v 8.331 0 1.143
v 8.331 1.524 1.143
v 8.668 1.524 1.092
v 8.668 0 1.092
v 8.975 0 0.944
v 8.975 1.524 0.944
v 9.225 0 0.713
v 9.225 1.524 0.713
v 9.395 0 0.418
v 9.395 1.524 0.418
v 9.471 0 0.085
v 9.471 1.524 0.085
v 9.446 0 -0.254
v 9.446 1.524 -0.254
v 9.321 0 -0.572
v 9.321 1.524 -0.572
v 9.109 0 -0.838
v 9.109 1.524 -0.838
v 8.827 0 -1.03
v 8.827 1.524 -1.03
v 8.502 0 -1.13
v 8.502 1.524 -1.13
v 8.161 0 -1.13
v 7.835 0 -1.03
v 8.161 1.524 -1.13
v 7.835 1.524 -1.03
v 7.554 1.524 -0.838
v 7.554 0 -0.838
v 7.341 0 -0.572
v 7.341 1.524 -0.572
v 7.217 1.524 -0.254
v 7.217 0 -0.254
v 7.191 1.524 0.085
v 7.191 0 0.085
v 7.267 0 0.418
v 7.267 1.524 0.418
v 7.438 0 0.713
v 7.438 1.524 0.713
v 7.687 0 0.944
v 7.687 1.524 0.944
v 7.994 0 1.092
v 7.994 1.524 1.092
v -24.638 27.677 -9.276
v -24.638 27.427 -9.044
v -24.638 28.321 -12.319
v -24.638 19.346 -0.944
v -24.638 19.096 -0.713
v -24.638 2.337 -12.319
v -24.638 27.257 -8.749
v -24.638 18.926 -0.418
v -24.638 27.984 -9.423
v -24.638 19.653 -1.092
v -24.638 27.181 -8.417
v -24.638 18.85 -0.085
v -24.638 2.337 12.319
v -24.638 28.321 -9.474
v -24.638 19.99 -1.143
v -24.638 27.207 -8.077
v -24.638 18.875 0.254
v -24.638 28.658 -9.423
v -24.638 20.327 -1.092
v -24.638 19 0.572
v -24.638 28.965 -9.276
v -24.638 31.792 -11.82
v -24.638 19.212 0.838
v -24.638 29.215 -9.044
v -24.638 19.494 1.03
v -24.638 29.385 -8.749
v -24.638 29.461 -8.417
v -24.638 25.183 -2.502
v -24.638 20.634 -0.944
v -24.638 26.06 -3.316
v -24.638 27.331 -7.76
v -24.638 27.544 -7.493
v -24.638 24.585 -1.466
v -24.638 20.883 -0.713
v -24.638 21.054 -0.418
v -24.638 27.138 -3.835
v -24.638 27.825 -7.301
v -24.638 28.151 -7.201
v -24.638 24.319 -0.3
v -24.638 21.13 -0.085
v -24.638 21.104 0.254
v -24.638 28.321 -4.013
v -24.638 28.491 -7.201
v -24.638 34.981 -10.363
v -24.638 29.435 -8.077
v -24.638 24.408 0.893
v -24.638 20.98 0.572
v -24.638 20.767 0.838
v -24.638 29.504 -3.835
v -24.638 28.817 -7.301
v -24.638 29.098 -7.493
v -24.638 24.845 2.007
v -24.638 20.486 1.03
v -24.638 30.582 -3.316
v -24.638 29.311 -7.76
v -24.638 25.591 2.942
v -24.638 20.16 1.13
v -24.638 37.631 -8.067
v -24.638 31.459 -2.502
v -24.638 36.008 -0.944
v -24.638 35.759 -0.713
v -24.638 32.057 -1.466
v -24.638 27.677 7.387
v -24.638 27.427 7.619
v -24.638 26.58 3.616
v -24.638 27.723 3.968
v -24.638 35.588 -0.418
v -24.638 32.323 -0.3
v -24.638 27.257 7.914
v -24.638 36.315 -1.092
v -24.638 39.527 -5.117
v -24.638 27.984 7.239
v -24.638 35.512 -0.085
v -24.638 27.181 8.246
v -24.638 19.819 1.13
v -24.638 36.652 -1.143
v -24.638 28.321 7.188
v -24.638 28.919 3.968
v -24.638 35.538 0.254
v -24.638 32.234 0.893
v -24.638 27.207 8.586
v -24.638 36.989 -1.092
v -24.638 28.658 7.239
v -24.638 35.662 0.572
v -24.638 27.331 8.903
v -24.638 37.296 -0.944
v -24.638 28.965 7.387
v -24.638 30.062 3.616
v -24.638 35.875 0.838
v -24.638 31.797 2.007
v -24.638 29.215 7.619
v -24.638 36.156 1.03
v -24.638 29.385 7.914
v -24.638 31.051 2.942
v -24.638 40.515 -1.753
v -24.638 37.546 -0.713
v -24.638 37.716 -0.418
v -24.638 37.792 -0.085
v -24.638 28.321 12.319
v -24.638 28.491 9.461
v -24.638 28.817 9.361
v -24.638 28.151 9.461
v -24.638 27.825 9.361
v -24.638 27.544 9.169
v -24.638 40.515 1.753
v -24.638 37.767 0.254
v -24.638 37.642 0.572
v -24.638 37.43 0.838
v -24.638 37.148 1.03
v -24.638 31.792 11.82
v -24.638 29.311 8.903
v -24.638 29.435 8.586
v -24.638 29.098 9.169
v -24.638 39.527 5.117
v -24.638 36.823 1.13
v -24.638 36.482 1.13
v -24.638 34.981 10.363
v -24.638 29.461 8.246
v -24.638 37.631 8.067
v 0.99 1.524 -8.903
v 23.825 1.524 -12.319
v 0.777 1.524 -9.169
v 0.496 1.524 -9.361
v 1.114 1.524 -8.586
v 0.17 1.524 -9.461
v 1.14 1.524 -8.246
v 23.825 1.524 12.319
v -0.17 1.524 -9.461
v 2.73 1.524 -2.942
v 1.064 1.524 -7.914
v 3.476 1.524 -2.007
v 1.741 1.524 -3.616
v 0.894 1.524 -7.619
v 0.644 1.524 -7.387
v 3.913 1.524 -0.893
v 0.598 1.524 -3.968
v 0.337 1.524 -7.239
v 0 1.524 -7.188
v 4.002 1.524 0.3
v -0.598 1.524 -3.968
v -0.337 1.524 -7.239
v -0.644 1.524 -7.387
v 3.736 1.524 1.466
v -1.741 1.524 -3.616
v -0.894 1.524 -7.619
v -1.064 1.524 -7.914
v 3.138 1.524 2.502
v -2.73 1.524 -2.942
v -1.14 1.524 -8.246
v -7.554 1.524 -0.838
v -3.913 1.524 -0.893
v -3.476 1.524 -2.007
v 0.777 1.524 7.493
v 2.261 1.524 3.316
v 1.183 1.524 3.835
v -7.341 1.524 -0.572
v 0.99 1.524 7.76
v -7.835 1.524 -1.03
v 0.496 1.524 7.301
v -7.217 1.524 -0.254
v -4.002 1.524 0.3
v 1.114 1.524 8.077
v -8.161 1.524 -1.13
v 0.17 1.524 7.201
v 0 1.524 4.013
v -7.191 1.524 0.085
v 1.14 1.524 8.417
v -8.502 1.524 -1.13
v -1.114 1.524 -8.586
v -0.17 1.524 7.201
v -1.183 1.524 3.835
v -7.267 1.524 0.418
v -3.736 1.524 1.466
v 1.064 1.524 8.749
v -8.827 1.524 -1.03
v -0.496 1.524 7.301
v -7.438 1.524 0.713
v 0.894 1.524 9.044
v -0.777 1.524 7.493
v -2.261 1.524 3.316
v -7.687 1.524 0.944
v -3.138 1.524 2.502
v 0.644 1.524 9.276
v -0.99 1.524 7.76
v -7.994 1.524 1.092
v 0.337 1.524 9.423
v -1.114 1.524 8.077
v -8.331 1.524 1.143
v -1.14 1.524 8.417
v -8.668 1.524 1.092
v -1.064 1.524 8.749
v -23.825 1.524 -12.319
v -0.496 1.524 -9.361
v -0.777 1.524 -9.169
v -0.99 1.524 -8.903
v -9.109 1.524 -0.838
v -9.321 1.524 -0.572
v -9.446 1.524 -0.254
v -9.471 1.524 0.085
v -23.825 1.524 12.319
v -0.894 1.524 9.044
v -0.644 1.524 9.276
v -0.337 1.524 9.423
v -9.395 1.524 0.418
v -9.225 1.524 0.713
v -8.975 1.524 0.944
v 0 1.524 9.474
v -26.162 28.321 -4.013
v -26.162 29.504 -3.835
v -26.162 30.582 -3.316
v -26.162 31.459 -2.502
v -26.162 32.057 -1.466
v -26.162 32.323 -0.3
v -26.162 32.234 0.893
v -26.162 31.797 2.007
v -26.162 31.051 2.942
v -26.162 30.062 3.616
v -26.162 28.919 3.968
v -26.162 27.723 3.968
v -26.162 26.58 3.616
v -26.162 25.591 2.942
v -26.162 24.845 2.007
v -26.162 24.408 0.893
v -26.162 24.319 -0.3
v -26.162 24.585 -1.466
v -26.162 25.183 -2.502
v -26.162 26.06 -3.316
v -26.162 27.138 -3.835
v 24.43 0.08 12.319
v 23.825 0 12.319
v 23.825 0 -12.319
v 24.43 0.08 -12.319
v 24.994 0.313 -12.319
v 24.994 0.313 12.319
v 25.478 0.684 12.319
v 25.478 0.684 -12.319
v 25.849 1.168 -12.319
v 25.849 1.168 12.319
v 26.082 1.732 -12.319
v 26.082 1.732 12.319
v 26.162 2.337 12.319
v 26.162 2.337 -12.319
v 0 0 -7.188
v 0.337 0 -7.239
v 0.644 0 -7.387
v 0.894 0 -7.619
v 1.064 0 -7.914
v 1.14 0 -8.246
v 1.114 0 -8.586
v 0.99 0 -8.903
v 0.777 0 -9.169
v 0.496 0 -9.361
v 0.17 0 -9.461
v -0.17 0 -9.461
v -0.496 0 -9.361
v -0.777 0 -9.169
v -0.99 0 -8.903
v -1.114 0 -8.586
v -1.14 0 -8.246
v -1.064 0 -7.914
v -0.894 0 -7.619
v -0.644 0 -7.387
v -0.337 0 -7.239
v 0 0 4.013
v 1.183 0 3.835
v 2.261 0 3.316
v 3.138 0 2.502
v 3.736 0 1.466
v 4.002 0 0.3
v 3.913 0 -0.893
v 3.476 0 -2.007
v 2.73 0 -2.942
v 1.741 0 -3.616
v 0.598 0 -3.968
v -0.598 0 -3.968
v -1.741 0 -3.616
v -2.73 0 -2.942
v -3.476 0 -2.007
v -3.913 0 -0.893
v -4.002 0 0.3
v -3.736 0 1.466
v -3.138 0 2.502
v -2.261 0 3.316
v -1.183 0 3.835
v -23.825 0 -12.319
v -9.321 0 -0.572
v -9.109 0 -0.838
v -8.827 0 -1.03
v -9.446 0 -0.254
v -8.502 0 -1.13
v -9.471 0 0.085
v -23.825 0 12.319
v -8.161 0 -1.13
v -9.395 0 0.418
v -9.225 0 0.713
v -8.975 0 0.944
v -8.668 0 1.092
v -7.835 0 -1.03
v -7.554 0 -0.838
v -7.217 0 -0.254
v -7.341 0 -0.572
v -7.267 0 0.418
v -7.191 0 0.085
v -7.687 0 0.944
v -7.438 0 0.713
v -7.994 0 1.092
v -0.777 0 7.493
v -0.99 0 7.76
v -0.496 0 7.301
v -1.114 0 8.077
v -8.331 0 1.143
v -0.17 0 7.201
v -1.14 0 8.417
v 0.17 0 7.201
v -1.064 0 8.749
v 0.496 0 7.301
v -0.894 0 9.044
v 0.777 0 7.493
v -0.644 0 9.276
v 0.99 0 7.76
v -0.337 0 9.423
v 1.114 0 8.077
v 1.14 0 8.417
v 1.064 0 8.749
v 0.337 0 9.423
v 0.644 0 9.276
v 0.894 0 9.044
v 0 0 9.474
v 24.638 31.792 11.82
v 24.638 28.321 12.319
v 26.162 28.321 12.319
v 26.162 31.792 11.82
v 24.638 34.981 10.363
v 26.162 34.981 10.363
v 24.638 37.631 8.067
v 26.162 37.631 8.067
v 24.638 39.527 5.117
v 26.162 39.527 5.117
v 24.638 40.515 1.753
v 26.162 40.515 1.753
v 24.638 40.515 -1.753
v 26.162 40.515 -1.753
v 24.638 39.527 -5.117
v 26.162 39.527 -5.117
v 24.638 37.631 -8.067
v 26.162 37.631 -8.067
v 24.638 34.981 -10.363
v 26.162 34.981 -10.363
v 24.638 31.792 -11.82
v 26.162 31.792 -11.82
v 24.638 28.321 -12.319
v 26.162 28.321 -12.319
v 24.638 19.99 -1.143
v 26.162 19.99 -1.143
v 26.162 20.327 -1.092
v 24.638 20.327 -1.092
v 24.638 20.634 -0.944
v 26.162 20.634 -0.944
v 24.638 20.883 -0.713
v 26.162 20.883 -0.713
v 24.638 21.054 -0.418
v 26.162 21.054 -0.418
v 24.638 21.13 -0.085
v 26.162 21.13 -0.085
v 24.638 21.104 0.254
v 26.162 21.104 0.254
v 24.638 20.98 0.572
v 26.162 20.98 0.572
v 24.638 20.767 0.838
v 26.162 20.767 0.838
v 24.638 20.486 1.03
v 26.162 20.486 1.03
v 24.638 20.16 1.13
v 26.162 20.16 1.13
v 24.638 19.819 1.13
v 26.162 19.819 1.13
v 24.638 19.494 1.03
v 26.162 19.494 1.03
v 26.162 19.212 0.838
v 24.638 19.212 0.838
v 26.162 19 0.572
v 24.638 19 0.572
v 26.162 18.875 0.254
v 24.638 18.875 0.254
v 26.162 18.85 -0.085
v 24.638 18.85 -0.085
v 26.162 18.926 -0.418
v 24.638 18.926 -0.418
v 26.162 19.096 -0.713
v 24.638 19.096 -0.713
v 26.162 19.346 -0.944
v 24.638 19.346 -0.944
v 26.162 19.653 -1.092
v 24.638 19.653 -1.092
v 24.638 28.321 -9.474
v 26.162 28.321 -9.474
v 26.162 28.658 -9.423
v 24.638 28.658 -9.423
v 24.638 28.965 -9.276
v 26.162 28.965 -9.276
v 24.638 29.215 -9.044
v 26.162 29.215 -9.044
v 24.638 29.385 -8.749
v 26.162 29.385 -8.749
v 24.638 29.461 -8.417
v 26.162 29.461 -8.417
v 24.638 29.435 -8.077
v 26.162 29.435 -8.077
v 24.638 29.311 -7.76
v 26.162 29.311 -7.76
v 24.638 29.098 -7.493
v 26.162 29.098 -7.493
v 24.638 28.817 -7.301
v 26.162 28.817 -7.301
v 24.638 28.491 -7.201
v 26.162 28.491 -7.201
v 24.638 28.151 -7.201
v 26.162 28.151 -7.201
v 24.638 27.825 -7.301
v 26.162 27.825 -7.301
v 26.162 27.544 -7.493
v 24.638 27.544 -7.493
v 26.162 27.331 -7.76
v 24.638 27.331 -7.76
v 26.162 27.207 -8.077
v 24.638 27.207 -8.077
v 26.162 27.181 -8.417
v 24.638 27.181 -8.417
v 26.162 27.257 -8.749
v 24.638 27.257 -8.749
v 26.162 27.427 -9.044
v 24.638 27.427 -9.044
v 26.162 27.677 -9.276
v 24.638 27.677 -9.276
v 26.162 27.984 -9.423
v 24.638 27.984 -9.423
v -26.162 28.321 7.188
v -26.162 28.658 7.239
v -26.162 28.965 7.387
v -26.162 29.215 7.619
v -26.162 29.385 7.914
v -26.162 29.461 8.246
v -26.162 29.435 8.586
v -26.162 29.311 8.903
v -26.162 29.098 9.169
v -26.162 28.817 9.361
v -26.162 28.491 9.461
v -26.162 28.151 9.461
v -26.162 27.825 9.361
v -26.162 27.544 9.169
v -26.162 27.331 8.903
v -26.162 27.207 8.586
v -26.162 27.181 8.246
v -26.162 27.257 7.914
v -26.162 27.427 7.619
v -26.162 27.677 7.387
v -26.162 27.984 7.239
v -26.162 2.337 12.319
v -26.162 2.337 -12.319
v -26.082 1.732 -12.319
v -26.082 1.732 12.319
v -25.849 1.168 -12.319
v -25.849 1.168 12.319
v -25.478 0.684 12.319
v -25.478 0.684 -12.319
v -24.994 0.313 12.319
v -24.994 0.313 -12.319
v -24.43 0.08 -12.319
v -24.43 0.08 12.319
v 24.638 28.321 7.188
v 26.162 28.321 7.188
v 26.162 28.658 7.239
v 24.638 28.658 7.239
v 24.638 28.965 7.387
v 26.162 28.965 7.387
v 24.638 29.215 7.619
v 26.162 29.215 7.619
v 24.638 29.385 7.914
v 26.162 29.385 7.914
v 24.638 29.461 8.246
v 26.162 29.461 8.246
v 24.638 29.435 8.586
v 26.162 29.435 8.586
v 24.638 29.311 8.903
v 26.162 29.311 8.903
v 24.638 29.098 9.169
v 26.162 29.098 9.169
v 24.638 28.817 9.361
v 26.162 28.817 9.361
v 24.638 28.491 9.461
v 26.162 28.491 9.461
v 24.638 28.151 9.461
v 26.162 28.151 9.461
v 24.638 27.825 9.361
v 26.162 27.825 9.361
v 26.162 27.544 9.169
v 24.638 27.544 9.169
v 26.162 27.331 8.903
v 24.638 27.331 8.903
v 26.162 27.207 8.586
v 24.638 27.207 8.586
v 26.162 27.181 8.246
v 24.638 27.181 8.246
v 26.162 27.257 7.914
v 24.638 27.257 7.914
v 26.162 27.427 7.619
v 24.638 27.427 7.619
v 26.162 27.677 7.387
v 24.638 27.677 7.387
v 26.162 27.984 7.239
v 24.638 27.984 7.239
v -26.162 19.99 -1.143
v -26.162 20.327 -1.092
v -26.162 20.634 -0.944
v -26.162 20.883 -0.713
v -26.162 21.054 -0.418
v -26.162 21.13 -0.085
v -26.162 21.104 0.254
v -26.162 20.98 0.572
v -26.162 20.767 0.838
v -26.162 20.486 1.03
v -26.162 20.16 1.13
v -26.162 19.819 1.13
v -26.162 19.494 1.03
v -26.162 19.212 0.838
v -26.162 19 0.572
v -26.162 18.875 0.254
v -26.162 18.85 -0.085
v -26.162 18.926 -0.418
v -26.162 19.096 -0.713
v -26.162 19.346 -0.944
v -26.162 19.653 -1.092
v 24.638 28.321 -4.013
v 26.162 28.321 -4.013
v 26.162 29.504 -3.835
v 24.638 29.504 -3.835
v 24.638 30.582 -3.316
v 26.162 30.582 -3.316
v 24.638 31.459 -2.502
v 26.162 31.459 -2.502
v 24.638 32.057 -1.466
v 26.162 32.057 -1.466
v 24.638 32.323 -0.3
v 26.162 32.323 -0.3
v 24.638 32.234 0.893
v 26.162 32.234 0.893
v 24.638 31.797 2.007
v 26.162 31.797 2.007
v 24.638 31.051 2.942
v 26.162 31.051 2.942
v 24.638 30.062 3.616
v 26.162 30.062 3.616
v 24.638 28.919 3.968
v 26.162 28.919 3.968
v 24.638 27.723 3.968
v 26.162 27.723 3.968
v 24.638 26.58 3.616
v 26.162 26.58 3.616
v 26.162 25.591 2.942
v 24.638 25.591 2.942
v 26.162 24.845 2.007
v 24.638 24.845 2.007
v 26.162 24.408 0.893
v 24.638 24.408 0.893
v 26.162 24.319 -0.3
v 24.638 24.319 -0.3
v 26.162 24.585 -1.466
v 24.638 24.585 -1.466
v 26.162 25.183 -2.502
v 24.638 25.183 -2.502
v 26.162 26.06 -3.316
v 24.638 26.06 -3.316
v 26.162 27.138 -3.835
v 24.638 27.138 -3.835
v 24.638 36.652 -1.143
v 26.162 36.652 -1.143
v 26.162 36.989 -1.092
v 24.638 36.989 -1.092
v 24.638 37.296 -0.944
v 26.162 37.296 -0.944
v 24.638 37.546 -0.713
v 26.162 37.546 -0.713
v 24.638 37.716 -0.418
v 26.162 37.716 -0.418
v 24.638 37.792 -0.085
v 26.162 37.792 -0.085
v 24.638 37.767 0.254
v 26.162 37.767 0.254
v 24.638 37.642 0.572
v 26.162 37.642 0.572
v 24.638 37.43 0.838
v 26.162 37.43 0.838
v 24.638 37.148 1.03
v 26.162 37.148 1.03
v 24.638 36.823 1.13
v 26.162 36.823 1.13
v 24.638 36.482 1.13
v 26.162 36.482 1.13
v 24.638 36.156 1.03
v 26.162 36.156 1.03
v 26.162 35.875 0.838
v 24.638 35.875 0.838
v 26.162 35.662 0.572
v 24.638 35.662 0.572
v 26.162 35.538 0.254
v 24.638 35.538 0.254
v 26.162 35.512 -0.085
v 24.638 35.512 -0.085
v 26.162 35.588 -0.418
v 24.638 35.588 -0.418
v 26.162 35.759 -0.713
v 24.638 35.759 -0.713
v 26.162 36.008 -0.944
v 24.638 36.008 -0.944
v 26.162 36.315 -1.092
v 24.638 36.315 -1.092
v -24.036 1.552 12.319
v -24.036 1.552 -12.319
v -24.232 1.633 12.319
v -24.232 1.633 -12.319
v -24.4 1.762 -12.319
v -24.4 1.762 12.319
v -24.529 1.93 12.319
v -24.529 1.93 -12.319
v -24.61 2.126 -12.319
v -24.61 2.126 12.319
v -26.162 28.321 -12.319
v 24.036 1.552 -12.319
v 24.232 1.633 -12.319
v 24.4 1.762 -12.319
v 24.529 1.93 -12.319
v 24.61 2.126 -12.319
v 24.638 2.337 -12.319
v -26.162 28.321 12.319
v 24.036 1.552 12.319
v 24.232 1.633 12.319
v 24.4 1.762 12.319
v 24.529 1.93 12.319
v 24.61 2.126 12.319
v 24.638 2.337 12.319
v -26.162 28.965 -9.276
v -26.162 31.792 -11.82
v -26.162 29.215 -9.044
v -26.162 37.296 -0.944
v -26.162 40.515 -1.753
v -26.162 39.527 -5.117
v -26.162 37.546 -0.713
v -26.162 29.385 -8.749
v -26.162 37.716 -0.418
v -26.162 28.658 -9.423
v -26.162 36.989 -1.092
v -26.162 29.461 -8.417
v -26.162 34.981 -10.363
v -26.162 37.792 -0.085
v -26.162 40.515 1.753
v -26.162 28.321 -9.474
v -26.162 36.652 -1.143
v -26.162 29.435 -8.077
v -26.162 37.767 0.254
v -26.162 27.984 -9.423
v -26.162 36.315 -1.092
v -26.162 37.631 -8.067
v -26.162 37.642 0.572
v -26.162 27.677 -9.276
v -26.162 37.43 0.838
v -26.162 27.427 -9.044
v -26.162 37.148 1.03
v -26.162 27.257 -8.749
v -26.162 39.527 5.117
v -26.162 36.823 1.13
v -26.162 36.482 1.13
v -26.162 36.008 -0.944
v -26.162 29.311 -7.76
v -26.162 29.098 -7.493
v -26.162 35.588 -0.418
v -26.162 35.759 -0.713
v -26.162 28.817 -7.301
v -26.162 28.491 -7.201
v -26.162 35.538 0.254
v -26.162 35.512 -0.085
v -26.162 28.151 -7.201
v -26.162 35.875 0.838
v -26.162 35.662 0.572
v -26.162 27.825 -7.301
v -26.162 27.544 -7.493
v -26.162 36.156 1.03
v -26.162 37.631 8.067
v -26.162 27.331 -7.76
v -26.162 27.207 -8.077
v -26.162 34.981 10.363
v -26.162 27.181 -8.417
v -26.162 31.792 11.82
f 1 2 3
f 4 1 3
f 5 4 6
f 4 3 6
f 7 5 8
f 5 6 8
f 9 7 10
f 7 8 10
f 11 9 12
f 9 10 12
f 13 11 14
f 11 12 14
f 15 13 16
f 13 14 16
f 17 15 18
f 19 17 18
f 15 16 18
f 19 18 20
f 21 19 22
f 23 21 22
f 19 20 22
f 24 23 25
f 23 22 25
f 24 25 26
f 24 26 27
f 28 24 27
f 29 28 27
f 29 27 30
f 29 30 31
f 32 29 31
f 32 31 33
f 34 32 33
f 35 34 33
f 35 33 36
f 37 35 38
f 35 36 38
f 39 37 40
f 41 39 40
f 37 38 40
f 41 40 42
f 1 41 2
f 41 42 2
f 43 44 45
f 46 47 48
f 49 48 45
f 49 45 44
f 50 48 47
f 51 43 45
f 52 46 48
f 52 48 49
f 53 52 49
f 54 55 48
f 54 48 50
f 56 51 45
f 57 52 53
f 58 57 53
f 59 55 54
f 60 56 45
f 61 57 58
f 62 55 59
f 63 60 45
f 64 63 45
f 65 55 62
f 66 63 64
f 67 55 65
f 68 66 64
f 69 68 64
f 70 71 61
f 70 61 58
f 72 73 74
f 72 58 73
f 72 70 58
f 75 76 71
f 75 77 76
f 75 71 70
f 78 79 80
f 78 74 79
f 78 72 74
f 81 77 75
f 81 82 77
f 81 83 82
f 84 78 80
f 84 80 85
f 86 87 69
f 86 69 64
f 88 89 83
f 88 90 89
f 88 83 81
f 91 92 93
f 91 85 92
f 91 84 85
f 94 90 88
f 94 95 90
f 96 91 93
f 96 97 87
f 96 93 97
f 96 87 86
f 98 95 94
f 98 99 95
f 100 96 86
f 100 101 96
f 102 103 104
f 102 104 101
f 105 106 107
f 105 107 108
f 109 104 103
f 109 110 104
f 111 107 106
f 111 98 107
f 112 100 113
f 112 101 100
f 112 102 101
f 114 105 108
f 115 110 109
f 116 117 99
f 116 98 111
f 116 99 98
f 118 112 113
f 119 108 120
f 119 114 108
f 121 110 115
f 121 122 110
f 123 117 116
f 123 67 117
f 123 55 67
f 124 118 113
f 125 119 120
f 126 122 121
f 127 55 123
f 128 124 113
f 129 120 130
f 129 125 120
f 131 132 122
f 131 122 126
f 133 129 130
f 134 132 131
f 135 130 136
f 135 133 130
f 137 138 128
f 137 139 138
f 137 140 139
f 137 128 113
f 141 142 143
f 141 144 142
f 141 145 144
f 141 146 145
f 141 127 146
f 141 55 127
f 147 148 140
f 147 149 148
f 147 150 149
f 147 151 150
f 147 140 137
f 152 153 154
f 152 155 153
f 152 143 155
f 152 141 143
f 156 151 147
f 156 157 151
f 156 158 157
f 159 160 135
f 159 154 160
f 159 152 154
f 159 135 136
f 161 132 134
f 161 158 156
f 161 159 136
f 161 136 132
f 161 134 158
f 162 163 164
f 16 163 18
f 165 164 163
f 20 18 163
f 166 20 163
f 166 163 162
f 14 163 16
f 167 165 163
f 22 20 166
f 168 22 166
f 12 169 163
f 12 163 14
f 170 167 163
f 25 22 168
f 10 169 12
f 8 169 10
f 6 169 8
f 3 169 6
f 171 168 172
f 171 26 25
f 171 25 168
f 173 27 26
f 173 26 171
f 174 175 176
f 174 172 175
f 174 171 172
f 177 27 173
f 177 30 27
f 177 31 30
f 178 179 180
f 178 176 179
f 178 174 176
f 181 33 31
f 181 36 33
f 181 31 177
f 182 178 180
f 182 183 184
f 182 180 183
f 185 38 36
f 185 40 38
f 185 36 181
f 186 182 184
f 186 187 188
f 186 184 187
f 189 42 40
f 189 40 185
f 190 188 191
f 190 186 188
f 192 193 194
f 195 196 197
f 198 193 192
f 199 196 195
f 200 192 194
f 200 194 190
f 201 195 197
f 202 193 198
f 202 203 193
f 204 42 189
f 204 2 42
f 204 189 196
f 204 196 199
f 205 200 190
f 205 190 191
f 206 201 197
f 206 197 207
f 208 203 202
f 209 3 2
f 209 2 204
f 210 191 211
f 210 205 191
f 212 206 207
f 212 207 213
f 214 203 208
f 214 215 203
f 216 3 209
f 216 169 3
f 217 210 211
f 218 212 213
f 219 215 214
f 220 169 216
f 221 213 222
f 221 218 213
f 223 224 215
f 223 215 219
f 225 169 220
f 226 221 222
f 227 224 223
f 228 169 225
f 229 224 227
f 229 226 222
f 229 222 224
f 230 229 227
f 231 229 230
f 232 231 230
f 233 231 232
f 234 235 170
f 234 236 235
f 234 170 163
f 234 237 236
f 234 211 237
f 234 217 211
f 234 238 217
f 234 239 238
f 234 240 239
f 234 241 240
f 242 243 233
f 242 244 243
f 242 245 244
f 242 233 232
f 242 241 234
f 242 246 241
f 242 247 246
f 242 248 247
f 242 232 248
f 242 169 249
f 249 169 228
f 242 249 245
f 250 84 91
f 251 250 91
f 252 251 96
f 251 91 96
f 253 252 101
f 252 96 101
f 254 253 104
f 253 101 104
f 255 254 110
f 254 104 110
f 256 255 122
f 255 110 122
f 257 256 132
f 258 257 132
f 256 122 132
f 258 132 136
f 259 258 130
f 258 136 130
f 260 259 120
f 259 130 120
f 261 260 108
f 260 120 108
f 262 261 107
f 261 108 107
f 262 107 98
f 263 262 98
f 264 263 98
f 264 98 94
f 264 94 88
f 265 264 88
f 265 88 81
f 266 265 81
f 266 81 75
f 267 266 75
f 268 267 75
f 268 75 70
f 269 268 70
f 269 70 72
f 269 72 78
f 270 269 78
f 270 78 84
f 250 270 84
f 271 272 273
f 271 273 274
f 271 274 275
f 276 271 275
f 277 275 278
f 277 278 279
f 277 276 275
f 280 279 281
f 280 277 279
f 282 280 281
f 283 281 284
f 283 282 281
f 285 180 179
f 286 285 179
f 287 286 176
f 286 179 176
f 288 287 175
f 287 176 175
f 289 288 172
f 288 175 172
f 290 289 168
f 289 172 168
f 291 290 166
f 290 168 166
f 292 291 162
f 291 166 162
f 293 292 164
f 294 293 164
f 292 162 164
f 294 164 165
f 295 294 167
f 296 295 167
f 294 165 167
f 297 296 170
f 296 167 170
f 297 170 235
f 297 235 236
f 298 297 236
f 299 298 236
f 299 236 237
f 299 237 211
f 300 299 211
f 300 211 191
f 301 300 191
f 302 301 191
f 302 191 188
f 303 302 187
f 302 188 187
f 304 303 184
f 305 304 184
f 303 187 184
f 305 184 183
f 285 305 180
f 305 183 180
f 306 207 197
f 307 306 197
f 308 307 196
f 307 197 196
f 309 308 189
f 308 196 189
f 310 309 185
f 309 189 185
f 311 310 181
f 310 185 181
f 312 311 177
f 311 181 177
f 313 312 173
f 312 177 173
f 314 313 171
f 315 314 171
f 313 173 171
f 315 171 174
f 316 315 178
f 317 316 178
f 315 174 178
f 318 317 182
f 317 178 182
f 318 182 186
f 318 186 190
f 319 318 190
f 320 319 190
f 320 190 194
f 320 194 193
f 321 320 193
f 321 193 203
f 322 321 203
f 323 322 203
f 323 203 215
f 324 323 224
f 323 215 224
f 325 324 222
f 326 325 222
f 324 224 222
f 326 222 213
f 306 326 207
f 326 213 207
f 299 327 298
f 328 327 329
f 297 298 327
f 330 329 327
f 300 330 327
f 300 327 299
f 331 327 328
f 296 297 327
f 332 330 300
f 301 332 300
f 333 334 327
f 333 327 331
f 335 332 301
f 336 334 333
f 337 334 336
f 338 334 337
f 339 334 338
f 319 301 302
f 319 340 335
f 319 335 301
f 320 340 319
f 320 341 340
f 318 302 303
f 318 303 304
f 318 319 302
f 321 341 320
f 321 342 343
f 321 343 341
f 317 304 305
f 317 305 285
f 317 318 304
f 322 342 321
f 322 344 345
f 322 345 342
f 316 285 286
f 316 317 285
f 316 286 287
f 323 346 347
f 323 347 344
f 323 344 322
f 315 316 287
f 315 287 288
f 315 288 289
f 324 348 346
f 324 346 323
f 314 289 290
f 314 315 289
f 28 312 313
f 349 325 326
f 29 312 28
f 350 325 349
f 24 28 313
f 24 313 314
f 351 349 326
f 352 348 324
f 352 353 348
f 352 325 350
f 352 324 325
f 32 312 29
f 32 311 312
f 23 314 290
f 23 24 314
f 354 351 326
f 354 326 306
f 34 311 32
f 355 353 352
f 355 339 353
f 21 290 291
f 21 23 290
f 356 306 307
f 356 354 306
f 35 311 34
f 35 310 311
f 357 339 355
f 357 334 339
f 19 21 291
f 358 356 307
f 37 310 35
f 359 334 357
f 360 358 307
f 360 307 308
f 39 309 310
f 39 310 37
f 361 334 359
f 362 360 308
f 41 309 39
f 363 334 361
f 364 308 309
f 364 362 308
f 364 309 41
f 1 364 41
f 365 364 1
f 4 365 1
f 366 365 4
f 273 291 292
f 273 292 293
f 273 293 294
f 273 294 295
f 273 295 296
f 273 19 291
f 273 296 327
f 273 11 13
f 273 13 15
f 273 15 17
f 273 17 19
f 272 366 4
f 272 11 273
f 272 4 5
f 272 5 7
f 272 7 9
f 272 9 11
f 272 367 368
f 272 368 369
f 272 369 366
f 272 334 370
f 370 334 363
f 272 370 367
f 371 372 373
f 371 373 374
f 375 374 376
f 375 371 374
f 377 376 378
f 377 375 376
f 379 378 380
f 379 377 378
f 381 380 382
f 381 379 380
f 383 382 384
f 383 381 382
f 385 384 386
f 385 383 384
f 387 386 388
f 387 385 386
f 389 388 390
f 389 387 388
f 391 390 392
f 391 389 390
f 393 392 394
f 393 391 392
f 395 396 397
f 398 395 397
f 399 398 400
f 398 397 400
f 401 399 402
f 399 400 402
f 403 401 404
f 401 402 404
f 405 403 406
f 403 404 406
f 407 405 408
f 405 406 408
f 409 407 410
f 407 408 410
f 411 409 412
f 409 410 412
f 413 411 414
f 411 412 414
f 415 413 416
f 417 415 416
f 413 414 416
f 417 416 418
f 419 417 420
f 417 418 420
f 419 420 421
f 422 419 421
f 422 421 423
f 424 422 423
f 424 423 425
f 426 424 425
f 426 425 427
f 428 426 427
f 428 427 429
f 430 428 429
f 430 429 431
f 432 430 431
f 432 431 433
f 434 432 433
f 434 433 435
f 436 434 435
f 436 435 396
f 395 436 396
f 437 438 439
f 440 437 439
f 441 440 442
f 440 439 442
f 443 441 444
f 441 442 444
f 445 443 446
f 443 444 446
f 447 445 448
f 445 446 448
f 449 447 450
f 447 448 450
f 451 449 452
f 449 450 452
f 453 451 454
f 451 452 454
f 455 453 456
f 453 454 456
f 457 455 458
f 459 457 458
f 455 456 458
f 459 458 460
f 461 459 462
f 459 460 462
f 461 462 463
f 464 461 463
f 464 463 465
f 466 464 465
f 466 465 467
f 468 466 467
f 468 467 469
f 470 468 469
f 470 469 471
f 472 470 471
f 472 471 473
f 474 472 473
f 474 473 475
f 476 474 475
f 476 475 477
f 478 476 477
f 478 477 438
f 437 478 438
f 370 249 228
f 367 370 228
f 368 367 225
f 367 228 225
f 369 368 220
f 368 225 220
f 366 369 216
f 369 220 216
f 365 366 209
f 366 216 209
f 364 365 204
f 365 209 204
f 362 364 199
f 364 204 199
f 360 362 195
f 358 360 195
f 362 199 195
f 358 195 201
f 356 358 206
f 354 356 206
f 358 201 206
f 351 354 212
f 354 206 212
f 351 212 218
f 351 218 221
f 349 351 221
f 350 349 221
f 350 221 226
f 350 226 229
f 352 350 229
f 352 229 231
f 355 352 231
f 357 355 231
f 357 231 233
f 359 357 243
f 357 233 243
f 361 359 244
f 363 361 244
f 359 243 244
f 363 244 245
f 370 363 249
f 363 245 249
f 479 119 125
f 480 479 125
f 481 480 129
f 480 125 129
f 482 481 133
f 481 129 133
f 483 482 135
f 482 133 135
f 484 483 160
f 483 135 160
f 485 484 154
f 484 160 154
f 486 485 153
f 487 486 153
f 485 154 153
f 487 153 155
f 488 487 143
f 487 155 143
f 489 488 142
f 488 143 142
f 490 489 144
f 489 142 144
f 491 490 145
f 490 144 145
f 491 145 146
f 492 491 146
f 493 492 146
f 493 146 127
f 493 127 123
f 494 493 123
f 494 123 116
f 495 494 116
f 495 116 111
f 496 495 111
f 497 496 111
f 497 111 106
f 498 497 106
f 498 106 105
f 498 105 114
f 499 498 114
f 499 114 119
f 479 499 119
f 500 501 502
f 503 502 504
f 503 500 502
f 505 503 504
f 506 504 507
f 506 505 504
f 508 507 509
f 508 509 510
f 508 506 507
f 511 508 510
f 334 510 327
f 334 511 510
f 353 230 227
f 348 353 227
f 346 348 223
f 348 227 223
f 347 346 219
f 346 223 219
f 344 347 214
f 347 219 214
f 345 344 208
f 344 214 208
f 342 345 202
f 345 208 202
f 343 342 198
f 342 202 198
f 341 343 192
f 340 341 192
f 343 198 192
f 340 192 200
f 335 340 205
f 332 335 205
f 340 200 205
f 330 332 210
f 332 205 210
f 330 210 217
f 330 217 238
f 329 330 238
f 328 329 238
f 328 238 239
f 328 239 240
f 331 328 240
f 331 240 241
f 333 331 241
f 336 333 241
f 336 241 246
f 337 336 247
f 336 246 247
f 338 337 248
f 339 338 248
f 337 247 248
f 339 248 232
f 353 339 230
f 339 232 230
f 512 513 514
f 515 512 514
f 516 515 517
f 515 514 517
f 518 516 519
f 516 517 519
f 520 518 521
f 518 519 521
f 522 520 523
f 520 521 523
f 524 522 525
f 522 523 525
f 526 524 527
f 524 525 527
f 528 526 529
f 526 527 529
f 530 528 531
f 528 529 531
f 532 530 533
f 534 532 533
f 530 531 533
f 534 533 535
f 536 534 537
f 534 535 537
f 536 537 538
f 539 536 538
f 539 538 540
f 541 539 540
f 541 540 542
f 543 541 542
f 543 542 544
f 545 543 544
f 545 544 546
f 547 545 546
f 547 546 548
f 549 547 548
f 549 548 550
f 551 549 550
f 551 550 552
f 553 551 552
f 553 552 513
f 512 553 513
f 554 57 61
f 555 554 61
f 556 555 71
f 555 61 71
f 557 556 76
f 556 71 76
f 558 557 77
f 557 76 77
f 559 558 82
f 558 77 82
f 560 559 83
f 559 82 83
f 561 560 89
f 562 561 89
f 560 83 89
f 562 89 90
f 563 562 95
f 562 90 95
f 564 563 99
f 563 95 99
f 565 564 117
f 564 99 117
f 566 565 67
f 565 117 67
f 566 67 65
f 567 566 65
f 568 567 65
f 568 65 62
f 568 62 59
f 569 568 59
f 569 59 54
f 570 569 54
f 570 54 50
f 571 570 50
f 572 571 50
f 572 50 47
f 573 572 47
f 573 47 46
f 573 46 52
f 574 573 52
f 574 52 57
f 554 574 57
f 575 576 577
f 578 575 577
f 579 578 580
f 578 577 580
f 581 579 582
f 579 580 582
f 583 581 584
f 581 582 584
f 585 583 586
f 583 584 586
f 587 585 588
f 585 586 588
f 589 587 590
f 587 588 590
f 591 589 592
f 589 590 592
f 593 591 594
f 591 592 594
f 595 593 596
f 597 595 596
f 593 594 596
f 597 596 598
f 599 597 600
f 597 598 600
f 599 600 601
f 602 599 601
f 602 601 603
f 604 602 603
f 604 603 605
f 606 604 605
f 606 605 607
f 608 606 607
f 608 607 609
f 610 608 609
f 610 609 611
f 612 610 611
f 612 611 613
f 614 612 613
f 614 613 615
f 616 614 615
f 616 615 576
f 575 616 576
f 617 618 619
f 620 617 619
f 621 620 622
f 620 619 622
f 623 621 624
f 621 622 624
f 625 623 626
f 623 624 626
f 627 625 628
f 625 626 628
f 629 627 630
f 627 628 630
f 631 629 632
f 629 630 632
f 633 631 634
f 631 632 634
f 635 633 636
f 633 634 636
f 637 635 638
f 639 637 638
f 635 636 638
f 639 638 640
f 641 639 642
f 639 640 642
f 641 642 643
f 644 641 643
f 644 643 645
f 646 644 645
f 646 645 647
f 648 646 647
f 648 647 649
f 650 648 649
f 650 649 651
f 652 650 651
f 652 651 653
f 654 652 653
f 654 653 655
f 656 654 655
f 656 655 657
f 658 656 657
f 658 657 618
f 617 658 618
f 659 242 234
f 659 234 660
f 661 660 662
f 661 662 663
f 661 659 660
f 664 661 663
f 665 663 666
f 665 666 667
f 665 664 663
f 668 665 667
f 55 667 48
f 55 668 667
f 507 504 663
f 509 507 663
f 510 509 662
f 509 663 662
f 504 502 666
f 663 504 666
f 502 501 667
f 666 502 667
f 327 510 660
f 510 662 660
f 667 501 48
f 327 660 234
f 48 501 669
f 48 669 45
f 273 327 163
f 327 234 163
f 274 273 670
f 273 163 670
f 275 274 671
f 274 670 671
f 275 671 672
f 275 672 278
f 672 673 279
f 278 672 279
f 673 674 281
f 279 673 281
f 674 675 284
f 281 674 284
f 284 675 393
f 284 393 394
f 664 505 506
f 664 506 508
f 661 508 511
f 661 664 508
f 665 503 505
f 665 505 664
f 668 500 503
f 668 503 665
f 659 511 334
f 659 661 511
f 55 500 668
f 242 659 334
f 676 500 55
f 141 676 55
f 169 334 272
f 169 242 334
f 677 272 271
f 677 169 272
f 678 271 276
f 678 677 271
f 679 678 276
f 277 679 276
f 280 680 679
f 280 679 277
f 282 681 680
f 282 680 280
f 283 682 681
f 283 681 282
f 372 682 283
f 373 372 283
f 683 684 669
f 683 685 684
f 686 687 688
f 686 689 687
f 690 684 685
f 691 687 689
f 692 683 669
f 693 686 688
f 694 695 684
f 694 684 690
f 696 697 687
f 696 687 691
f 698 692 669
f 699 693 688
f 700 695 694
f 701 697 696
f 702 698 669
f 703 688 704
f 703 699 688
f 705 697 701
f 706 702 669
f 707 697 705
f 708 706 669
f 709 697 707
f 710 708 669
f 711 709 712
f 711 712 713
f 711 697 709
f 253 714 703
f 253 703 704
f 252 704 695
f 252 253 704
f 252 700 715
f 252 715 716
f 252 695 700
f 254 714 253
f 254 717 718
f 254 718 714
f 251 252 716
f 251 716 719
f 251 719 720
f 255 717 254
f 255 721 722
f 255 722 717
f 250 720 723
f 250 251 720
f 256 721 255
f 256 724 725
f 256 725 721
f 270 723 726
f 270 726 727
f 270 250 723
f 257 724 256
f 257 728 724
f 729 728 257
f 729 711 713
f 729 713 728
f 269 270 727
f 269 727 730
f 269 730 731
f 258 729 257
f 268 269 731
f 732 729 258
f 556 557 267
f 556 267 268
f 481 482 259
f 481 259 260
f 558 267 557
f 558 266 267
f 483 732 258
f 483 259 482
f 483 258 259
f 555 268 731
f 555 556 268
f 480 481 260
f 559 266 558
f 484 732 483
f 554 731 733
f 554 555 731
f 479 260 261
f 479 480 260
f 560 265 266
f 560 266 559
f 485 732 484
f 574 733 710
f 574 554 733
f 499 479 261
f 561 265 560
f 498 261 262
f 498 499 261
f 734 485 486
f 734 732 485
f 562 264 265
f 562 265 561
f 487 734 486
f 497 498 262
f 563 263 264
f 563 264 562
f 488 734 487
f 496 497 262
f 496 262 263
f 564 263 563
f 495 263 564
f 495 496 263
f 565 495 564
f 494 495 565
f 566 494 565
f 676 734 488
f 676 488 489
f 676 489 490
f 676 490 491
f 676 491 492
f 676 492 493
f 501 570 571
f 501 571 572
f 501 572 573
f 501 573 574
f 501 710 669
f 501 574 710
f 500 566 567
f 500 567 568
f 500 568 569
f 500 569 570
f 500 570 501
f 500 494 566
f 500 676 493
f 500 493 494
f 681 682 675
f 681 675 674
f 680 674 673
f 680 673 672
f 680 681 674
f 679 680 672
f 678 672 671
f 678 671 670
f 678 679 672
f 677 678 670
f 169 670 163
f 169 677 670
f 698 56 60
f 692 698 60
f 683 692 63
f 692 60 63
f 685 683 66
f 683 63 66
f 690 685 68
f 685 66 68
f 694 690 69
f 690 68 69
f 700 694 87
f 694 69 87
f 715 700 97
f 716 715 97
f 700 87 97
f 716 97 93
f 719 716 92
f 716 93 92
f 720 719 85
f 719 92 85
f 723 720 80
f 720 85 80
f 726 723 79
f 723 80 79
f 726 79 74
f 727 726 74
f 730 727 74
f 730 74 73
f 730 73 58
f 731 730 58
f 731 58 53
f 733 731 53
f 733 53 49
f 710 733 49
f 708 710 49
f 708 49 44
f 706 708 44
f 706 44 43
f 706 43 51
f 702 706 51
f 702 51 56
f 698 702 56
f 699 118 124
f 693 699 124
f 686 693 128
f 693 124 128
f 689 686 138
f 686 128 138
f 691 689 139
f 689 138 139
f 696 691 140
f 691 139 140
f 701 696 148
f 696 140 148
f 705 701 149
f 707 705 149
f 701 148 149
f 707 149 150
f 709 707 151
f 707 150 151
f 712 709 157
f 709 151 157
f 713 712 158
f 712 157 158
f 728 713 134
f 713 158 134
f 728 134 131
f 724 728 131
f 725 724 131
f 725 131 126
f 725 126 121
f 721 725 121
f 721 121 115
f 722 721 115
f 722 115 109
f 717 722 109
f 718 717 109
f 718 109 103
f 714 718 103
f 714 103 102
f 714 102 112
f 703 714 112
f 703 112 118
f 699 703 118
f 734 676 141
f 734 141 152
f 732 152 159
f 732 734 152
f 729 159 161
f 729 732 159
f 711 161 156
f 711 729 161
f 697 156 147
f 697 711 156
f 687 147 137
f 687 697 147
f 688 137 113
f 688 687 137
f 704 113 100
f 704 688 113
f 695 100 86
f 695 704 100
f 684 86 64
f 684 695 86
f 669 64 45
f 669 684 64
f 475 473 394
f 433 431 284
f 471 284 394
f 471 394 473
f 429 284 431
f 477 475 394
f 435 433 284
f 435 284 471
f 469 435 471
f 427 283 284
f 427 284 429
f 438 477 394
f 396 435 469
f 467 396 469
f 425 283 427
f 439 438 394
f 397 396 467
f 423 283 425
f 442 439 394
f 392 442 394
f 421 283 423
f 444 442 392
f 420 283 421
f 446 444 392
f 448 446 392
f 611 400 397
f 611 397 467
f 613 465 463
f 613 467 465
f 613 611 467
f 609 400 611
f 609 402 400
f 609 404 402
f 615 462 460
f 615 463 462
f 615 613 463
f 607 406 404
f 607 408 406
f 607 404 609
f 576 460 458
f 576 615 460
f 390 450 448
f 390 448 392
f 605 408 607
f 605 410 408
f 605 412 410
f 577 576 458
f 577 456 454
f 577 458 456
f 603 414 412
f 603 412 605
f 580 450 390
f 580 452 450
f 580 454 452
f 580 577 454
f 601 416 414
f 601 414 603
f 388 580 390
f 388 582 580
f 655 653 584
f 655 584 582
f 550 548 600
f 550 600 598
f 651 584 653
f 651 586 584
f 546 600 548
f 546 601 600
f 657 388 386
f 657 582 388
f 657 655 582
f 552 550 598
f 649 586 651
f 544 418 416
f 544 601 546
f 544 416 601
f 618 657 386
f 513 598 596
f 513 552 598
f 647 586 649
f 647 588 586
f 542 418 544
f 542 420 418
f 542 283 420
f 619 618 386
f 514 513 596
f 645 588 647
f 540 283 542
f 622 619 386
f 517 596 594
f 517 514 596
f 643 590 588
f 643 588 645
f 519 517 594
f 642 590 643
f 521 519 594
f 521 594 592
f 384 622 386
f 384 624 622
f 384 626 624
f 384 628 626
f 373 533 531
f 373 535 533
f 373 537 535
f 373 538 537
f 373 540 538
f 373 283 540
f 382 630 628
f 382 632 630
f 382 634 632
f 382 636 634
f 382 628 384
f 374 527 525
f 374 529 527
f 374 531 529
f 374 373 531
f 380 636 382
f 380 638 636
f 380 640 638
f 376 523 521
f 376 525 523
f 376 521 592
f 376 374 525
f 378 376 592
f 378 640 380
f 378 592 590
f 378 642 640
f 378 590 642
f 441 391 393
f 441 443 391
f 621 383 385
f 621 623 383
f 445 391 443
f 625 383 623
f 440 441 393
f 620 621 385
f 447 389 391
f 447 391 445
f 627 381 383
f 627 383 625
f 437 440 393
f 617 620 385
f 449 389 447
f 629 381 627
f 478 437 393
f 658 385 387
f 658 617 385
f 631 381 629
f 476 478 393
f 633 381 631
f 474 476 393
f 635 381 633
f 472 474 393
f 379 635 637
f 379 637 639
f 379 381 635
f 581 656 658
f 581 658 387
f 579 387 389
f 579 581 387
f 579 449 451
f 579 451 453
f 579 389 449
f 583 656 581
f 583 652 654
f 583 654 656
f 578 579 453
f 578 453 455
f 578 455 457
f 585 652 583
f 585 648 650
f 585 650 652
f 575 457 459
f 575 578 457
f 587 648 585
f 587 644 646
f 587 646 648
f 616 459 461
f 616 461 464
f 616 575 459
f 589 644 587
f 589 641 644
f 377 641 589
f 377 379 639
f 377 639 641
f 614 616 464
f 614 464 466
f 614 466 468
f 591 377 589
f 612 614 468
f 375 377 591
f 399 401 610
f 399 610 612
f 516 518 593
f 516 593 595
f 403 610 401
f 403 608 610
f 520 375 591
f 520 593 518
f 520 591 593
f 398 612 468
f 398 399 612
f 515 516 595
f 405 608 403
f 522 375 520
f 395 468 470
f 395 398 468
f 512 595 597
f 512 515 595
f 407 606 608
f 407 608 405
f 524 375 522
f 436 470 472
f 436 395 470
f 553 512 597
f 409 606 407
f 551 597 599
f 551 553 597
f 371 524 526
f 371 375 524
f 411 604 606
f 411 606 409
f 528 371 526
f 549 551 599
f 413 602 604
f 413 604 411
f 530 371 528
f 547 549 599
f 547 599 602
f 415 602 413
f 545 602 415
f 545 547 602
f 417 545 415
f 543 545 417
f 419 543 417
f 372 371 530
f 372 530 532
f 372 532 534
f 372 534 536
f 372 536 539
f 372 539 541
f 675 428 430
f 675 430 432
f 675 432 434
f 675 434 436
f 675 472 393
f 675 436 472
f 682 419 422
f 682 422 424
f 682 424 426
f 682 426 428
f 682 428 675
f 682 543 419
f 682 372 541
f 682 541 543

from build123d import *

# Parameters (mm, degrees)
BASE_FLANGE1_DEPTH = 12.319
FILLET1_RADIUS     = 12.319
FILLET1_LENGTH     = 1.524
FILLET2_RADIUS     = 12.319
FILLET2_LENGTH     = 1.524
SKETCH3_R          = 4.0132
SKETCH3_R_2        = 1.143
EXTRUDE1_DEPTH     = 68.388191377
SKETCH4_R          = 4.0132
SKETCH4_R_2        = 1.143
EXTRUDE2_DEPTH     = 1.524


# Sheet-metal steps are written as plain solids
with BuildPart() as part:
    # Sketch1 → Base-Flange1 (new, symmetric)
    with BuildSketch(Plane.XY):
        with BuildLine():
            Line((-26.162, 40.64), (-26.162, 2.3368))
            ThreePointArc((-26.162, 2.3368), (-25.477567126, 0.684432874), (-23.8252, 0))
            Line((-23.8252, 0), (23.8252, 0))
            ThreePointArc((23.8252, 0), (25.477567126, 0.684432874), (26.162, 2.3368))
            Line((26.162, 2.3368), (26.162, 40.64))
            Line((26.162, 40.64), (24.638, 40.64))
            Line((24.638, 40.64), (24.638, 2.3368))
            ThreePointArc((24.638, 2.3368), (24.399936392, 1.762063608), (23.8252, 1.524))
            Line((23.8252, 1.524), (-23.8252, 1.524))
            ThreePointArc((-23.8252, 1.524), (-24.399936392, 1.762063608), (-24.638, 2.3368))
            Line((-24.638, 2.3368), (-24.638, 40.64))
            Line((-24.638, 40.64), (-26.162, 40.64))
        make_face()
    extrude(amount=BASE_FLANGE1_DEPTH, both=True)

    # Fillet1: full round fillet: the end face becomes a half cylinder, R = half its width
    fillet1_face = Plane((-25.4, 40.64, 0), x_dir=(-1, 0, 0), z_dir=(0, 1, 0))  # on the end face: x along it, z out of the body
    fillet1_slab = fillet1_face.offset(-FILLET1_RADIUS / 2) * Box(FILLET1_LENGTH, 2 * FILLET1_RADIUS, FILLET1_RADIUS, mode=Mode.PRIVATE)  # the body's end, R deep
    fillet1_round = Plane((-25.4, 28.321, 0), x_dir=(0, 1, 0), z_dir=(-1, 0, 0)) * Cylinder(FILLET1_RADIUS, FILLET1_LENGTH, mode=Mode.PRIVATE)  # its axis R under the face
    add(fillet1_slab - fillet1_round, mode=Mode.SUBTRACT)

    # Fillet2: full round fillet: the end face becomes a half cylinder, R = half its width
    fillet2_face = Plane((25.4, 40.64, 0), x_dir=(-1, 0, 0), z_dir=(0, 1, 0))  # on the end face: x along it, z out of the body
    fillet2_slab = fillet2_face.offset(-FILLET2_RADIUS / 2) * Box(FILLET2_LENGTH, 2 * FILLET2_RADIUS, FILLET2_RADIUS, mode=Mode.PRIVATE)  # the body's end, R deep
    fillet2_round = Plane((25.4, 28.321, 0), x_dir=(0, 1, 0), z_dir=(-1, 0, 0)) * Cylinder(FILLET2_RADIUS, FILLET2_LENGTH, mode=Mode.PRIVATE)  # its axis R under the face
    add(fillet2_slab - fillet2_round, mode=Mode.SUBTRACT)

    # Sketch3 → Extrude1 (cut, through all)
    with BuildSketch(Plane(origin=(26.162, 0, 0), x_dir=(0, 0, -1), z_dir=(1, 0, 0))):
        with Locations((0, 28.321)):
            Circle(SKETCH3_R)
        with Locations((0, 36.6522)):
            Circle(SKETCH3_R_2)
        with Locations((8.3312, 28.321)):
            Circle(SKETCH3_R_2)
        with Locations((0, 19.9898)):
            Circle(SKETCH3_R_2)
        with Locations((-8.3312, 28.321)):
            Circle(SKETCH3_R_2)
    extrude(amount=-EXTRUDE1_DEPTH, mode=Mode.SUBTRACT)

    # Sketch4 → Extrude2 (cut)
    with BuildSketch(Plane(origin=(0, 1.524, 0), x_dir=(1, 0, 0), z_dir=(0, 1, 0))):
        with Locations(Location((0, 0, 0), (0, 0, 270))):
            Circle(SKETCH4_R)
        with Locations(Location((0, 8.3312, 0), (0, 0, 270))):
            Circle(SKETCH4_R_2)
        with Locations(Location((8.3312, 0, 0), (0, 0, 270))):
            Circle(SKETCH4_R_2)
        with Locations(Location((0, -8.3312, 0), (0, 0, 270))):
            Circle(SKETCH4_R_2)
        with Locations(Location((-8.3312, 0, 0), (0, 0, 270))):
            Circle(SKETCH4_R_2)
    extrude(amount=-EXTRUDE2_DEPTH, mode=Mode.SUBTRACT)


solid = part.part
